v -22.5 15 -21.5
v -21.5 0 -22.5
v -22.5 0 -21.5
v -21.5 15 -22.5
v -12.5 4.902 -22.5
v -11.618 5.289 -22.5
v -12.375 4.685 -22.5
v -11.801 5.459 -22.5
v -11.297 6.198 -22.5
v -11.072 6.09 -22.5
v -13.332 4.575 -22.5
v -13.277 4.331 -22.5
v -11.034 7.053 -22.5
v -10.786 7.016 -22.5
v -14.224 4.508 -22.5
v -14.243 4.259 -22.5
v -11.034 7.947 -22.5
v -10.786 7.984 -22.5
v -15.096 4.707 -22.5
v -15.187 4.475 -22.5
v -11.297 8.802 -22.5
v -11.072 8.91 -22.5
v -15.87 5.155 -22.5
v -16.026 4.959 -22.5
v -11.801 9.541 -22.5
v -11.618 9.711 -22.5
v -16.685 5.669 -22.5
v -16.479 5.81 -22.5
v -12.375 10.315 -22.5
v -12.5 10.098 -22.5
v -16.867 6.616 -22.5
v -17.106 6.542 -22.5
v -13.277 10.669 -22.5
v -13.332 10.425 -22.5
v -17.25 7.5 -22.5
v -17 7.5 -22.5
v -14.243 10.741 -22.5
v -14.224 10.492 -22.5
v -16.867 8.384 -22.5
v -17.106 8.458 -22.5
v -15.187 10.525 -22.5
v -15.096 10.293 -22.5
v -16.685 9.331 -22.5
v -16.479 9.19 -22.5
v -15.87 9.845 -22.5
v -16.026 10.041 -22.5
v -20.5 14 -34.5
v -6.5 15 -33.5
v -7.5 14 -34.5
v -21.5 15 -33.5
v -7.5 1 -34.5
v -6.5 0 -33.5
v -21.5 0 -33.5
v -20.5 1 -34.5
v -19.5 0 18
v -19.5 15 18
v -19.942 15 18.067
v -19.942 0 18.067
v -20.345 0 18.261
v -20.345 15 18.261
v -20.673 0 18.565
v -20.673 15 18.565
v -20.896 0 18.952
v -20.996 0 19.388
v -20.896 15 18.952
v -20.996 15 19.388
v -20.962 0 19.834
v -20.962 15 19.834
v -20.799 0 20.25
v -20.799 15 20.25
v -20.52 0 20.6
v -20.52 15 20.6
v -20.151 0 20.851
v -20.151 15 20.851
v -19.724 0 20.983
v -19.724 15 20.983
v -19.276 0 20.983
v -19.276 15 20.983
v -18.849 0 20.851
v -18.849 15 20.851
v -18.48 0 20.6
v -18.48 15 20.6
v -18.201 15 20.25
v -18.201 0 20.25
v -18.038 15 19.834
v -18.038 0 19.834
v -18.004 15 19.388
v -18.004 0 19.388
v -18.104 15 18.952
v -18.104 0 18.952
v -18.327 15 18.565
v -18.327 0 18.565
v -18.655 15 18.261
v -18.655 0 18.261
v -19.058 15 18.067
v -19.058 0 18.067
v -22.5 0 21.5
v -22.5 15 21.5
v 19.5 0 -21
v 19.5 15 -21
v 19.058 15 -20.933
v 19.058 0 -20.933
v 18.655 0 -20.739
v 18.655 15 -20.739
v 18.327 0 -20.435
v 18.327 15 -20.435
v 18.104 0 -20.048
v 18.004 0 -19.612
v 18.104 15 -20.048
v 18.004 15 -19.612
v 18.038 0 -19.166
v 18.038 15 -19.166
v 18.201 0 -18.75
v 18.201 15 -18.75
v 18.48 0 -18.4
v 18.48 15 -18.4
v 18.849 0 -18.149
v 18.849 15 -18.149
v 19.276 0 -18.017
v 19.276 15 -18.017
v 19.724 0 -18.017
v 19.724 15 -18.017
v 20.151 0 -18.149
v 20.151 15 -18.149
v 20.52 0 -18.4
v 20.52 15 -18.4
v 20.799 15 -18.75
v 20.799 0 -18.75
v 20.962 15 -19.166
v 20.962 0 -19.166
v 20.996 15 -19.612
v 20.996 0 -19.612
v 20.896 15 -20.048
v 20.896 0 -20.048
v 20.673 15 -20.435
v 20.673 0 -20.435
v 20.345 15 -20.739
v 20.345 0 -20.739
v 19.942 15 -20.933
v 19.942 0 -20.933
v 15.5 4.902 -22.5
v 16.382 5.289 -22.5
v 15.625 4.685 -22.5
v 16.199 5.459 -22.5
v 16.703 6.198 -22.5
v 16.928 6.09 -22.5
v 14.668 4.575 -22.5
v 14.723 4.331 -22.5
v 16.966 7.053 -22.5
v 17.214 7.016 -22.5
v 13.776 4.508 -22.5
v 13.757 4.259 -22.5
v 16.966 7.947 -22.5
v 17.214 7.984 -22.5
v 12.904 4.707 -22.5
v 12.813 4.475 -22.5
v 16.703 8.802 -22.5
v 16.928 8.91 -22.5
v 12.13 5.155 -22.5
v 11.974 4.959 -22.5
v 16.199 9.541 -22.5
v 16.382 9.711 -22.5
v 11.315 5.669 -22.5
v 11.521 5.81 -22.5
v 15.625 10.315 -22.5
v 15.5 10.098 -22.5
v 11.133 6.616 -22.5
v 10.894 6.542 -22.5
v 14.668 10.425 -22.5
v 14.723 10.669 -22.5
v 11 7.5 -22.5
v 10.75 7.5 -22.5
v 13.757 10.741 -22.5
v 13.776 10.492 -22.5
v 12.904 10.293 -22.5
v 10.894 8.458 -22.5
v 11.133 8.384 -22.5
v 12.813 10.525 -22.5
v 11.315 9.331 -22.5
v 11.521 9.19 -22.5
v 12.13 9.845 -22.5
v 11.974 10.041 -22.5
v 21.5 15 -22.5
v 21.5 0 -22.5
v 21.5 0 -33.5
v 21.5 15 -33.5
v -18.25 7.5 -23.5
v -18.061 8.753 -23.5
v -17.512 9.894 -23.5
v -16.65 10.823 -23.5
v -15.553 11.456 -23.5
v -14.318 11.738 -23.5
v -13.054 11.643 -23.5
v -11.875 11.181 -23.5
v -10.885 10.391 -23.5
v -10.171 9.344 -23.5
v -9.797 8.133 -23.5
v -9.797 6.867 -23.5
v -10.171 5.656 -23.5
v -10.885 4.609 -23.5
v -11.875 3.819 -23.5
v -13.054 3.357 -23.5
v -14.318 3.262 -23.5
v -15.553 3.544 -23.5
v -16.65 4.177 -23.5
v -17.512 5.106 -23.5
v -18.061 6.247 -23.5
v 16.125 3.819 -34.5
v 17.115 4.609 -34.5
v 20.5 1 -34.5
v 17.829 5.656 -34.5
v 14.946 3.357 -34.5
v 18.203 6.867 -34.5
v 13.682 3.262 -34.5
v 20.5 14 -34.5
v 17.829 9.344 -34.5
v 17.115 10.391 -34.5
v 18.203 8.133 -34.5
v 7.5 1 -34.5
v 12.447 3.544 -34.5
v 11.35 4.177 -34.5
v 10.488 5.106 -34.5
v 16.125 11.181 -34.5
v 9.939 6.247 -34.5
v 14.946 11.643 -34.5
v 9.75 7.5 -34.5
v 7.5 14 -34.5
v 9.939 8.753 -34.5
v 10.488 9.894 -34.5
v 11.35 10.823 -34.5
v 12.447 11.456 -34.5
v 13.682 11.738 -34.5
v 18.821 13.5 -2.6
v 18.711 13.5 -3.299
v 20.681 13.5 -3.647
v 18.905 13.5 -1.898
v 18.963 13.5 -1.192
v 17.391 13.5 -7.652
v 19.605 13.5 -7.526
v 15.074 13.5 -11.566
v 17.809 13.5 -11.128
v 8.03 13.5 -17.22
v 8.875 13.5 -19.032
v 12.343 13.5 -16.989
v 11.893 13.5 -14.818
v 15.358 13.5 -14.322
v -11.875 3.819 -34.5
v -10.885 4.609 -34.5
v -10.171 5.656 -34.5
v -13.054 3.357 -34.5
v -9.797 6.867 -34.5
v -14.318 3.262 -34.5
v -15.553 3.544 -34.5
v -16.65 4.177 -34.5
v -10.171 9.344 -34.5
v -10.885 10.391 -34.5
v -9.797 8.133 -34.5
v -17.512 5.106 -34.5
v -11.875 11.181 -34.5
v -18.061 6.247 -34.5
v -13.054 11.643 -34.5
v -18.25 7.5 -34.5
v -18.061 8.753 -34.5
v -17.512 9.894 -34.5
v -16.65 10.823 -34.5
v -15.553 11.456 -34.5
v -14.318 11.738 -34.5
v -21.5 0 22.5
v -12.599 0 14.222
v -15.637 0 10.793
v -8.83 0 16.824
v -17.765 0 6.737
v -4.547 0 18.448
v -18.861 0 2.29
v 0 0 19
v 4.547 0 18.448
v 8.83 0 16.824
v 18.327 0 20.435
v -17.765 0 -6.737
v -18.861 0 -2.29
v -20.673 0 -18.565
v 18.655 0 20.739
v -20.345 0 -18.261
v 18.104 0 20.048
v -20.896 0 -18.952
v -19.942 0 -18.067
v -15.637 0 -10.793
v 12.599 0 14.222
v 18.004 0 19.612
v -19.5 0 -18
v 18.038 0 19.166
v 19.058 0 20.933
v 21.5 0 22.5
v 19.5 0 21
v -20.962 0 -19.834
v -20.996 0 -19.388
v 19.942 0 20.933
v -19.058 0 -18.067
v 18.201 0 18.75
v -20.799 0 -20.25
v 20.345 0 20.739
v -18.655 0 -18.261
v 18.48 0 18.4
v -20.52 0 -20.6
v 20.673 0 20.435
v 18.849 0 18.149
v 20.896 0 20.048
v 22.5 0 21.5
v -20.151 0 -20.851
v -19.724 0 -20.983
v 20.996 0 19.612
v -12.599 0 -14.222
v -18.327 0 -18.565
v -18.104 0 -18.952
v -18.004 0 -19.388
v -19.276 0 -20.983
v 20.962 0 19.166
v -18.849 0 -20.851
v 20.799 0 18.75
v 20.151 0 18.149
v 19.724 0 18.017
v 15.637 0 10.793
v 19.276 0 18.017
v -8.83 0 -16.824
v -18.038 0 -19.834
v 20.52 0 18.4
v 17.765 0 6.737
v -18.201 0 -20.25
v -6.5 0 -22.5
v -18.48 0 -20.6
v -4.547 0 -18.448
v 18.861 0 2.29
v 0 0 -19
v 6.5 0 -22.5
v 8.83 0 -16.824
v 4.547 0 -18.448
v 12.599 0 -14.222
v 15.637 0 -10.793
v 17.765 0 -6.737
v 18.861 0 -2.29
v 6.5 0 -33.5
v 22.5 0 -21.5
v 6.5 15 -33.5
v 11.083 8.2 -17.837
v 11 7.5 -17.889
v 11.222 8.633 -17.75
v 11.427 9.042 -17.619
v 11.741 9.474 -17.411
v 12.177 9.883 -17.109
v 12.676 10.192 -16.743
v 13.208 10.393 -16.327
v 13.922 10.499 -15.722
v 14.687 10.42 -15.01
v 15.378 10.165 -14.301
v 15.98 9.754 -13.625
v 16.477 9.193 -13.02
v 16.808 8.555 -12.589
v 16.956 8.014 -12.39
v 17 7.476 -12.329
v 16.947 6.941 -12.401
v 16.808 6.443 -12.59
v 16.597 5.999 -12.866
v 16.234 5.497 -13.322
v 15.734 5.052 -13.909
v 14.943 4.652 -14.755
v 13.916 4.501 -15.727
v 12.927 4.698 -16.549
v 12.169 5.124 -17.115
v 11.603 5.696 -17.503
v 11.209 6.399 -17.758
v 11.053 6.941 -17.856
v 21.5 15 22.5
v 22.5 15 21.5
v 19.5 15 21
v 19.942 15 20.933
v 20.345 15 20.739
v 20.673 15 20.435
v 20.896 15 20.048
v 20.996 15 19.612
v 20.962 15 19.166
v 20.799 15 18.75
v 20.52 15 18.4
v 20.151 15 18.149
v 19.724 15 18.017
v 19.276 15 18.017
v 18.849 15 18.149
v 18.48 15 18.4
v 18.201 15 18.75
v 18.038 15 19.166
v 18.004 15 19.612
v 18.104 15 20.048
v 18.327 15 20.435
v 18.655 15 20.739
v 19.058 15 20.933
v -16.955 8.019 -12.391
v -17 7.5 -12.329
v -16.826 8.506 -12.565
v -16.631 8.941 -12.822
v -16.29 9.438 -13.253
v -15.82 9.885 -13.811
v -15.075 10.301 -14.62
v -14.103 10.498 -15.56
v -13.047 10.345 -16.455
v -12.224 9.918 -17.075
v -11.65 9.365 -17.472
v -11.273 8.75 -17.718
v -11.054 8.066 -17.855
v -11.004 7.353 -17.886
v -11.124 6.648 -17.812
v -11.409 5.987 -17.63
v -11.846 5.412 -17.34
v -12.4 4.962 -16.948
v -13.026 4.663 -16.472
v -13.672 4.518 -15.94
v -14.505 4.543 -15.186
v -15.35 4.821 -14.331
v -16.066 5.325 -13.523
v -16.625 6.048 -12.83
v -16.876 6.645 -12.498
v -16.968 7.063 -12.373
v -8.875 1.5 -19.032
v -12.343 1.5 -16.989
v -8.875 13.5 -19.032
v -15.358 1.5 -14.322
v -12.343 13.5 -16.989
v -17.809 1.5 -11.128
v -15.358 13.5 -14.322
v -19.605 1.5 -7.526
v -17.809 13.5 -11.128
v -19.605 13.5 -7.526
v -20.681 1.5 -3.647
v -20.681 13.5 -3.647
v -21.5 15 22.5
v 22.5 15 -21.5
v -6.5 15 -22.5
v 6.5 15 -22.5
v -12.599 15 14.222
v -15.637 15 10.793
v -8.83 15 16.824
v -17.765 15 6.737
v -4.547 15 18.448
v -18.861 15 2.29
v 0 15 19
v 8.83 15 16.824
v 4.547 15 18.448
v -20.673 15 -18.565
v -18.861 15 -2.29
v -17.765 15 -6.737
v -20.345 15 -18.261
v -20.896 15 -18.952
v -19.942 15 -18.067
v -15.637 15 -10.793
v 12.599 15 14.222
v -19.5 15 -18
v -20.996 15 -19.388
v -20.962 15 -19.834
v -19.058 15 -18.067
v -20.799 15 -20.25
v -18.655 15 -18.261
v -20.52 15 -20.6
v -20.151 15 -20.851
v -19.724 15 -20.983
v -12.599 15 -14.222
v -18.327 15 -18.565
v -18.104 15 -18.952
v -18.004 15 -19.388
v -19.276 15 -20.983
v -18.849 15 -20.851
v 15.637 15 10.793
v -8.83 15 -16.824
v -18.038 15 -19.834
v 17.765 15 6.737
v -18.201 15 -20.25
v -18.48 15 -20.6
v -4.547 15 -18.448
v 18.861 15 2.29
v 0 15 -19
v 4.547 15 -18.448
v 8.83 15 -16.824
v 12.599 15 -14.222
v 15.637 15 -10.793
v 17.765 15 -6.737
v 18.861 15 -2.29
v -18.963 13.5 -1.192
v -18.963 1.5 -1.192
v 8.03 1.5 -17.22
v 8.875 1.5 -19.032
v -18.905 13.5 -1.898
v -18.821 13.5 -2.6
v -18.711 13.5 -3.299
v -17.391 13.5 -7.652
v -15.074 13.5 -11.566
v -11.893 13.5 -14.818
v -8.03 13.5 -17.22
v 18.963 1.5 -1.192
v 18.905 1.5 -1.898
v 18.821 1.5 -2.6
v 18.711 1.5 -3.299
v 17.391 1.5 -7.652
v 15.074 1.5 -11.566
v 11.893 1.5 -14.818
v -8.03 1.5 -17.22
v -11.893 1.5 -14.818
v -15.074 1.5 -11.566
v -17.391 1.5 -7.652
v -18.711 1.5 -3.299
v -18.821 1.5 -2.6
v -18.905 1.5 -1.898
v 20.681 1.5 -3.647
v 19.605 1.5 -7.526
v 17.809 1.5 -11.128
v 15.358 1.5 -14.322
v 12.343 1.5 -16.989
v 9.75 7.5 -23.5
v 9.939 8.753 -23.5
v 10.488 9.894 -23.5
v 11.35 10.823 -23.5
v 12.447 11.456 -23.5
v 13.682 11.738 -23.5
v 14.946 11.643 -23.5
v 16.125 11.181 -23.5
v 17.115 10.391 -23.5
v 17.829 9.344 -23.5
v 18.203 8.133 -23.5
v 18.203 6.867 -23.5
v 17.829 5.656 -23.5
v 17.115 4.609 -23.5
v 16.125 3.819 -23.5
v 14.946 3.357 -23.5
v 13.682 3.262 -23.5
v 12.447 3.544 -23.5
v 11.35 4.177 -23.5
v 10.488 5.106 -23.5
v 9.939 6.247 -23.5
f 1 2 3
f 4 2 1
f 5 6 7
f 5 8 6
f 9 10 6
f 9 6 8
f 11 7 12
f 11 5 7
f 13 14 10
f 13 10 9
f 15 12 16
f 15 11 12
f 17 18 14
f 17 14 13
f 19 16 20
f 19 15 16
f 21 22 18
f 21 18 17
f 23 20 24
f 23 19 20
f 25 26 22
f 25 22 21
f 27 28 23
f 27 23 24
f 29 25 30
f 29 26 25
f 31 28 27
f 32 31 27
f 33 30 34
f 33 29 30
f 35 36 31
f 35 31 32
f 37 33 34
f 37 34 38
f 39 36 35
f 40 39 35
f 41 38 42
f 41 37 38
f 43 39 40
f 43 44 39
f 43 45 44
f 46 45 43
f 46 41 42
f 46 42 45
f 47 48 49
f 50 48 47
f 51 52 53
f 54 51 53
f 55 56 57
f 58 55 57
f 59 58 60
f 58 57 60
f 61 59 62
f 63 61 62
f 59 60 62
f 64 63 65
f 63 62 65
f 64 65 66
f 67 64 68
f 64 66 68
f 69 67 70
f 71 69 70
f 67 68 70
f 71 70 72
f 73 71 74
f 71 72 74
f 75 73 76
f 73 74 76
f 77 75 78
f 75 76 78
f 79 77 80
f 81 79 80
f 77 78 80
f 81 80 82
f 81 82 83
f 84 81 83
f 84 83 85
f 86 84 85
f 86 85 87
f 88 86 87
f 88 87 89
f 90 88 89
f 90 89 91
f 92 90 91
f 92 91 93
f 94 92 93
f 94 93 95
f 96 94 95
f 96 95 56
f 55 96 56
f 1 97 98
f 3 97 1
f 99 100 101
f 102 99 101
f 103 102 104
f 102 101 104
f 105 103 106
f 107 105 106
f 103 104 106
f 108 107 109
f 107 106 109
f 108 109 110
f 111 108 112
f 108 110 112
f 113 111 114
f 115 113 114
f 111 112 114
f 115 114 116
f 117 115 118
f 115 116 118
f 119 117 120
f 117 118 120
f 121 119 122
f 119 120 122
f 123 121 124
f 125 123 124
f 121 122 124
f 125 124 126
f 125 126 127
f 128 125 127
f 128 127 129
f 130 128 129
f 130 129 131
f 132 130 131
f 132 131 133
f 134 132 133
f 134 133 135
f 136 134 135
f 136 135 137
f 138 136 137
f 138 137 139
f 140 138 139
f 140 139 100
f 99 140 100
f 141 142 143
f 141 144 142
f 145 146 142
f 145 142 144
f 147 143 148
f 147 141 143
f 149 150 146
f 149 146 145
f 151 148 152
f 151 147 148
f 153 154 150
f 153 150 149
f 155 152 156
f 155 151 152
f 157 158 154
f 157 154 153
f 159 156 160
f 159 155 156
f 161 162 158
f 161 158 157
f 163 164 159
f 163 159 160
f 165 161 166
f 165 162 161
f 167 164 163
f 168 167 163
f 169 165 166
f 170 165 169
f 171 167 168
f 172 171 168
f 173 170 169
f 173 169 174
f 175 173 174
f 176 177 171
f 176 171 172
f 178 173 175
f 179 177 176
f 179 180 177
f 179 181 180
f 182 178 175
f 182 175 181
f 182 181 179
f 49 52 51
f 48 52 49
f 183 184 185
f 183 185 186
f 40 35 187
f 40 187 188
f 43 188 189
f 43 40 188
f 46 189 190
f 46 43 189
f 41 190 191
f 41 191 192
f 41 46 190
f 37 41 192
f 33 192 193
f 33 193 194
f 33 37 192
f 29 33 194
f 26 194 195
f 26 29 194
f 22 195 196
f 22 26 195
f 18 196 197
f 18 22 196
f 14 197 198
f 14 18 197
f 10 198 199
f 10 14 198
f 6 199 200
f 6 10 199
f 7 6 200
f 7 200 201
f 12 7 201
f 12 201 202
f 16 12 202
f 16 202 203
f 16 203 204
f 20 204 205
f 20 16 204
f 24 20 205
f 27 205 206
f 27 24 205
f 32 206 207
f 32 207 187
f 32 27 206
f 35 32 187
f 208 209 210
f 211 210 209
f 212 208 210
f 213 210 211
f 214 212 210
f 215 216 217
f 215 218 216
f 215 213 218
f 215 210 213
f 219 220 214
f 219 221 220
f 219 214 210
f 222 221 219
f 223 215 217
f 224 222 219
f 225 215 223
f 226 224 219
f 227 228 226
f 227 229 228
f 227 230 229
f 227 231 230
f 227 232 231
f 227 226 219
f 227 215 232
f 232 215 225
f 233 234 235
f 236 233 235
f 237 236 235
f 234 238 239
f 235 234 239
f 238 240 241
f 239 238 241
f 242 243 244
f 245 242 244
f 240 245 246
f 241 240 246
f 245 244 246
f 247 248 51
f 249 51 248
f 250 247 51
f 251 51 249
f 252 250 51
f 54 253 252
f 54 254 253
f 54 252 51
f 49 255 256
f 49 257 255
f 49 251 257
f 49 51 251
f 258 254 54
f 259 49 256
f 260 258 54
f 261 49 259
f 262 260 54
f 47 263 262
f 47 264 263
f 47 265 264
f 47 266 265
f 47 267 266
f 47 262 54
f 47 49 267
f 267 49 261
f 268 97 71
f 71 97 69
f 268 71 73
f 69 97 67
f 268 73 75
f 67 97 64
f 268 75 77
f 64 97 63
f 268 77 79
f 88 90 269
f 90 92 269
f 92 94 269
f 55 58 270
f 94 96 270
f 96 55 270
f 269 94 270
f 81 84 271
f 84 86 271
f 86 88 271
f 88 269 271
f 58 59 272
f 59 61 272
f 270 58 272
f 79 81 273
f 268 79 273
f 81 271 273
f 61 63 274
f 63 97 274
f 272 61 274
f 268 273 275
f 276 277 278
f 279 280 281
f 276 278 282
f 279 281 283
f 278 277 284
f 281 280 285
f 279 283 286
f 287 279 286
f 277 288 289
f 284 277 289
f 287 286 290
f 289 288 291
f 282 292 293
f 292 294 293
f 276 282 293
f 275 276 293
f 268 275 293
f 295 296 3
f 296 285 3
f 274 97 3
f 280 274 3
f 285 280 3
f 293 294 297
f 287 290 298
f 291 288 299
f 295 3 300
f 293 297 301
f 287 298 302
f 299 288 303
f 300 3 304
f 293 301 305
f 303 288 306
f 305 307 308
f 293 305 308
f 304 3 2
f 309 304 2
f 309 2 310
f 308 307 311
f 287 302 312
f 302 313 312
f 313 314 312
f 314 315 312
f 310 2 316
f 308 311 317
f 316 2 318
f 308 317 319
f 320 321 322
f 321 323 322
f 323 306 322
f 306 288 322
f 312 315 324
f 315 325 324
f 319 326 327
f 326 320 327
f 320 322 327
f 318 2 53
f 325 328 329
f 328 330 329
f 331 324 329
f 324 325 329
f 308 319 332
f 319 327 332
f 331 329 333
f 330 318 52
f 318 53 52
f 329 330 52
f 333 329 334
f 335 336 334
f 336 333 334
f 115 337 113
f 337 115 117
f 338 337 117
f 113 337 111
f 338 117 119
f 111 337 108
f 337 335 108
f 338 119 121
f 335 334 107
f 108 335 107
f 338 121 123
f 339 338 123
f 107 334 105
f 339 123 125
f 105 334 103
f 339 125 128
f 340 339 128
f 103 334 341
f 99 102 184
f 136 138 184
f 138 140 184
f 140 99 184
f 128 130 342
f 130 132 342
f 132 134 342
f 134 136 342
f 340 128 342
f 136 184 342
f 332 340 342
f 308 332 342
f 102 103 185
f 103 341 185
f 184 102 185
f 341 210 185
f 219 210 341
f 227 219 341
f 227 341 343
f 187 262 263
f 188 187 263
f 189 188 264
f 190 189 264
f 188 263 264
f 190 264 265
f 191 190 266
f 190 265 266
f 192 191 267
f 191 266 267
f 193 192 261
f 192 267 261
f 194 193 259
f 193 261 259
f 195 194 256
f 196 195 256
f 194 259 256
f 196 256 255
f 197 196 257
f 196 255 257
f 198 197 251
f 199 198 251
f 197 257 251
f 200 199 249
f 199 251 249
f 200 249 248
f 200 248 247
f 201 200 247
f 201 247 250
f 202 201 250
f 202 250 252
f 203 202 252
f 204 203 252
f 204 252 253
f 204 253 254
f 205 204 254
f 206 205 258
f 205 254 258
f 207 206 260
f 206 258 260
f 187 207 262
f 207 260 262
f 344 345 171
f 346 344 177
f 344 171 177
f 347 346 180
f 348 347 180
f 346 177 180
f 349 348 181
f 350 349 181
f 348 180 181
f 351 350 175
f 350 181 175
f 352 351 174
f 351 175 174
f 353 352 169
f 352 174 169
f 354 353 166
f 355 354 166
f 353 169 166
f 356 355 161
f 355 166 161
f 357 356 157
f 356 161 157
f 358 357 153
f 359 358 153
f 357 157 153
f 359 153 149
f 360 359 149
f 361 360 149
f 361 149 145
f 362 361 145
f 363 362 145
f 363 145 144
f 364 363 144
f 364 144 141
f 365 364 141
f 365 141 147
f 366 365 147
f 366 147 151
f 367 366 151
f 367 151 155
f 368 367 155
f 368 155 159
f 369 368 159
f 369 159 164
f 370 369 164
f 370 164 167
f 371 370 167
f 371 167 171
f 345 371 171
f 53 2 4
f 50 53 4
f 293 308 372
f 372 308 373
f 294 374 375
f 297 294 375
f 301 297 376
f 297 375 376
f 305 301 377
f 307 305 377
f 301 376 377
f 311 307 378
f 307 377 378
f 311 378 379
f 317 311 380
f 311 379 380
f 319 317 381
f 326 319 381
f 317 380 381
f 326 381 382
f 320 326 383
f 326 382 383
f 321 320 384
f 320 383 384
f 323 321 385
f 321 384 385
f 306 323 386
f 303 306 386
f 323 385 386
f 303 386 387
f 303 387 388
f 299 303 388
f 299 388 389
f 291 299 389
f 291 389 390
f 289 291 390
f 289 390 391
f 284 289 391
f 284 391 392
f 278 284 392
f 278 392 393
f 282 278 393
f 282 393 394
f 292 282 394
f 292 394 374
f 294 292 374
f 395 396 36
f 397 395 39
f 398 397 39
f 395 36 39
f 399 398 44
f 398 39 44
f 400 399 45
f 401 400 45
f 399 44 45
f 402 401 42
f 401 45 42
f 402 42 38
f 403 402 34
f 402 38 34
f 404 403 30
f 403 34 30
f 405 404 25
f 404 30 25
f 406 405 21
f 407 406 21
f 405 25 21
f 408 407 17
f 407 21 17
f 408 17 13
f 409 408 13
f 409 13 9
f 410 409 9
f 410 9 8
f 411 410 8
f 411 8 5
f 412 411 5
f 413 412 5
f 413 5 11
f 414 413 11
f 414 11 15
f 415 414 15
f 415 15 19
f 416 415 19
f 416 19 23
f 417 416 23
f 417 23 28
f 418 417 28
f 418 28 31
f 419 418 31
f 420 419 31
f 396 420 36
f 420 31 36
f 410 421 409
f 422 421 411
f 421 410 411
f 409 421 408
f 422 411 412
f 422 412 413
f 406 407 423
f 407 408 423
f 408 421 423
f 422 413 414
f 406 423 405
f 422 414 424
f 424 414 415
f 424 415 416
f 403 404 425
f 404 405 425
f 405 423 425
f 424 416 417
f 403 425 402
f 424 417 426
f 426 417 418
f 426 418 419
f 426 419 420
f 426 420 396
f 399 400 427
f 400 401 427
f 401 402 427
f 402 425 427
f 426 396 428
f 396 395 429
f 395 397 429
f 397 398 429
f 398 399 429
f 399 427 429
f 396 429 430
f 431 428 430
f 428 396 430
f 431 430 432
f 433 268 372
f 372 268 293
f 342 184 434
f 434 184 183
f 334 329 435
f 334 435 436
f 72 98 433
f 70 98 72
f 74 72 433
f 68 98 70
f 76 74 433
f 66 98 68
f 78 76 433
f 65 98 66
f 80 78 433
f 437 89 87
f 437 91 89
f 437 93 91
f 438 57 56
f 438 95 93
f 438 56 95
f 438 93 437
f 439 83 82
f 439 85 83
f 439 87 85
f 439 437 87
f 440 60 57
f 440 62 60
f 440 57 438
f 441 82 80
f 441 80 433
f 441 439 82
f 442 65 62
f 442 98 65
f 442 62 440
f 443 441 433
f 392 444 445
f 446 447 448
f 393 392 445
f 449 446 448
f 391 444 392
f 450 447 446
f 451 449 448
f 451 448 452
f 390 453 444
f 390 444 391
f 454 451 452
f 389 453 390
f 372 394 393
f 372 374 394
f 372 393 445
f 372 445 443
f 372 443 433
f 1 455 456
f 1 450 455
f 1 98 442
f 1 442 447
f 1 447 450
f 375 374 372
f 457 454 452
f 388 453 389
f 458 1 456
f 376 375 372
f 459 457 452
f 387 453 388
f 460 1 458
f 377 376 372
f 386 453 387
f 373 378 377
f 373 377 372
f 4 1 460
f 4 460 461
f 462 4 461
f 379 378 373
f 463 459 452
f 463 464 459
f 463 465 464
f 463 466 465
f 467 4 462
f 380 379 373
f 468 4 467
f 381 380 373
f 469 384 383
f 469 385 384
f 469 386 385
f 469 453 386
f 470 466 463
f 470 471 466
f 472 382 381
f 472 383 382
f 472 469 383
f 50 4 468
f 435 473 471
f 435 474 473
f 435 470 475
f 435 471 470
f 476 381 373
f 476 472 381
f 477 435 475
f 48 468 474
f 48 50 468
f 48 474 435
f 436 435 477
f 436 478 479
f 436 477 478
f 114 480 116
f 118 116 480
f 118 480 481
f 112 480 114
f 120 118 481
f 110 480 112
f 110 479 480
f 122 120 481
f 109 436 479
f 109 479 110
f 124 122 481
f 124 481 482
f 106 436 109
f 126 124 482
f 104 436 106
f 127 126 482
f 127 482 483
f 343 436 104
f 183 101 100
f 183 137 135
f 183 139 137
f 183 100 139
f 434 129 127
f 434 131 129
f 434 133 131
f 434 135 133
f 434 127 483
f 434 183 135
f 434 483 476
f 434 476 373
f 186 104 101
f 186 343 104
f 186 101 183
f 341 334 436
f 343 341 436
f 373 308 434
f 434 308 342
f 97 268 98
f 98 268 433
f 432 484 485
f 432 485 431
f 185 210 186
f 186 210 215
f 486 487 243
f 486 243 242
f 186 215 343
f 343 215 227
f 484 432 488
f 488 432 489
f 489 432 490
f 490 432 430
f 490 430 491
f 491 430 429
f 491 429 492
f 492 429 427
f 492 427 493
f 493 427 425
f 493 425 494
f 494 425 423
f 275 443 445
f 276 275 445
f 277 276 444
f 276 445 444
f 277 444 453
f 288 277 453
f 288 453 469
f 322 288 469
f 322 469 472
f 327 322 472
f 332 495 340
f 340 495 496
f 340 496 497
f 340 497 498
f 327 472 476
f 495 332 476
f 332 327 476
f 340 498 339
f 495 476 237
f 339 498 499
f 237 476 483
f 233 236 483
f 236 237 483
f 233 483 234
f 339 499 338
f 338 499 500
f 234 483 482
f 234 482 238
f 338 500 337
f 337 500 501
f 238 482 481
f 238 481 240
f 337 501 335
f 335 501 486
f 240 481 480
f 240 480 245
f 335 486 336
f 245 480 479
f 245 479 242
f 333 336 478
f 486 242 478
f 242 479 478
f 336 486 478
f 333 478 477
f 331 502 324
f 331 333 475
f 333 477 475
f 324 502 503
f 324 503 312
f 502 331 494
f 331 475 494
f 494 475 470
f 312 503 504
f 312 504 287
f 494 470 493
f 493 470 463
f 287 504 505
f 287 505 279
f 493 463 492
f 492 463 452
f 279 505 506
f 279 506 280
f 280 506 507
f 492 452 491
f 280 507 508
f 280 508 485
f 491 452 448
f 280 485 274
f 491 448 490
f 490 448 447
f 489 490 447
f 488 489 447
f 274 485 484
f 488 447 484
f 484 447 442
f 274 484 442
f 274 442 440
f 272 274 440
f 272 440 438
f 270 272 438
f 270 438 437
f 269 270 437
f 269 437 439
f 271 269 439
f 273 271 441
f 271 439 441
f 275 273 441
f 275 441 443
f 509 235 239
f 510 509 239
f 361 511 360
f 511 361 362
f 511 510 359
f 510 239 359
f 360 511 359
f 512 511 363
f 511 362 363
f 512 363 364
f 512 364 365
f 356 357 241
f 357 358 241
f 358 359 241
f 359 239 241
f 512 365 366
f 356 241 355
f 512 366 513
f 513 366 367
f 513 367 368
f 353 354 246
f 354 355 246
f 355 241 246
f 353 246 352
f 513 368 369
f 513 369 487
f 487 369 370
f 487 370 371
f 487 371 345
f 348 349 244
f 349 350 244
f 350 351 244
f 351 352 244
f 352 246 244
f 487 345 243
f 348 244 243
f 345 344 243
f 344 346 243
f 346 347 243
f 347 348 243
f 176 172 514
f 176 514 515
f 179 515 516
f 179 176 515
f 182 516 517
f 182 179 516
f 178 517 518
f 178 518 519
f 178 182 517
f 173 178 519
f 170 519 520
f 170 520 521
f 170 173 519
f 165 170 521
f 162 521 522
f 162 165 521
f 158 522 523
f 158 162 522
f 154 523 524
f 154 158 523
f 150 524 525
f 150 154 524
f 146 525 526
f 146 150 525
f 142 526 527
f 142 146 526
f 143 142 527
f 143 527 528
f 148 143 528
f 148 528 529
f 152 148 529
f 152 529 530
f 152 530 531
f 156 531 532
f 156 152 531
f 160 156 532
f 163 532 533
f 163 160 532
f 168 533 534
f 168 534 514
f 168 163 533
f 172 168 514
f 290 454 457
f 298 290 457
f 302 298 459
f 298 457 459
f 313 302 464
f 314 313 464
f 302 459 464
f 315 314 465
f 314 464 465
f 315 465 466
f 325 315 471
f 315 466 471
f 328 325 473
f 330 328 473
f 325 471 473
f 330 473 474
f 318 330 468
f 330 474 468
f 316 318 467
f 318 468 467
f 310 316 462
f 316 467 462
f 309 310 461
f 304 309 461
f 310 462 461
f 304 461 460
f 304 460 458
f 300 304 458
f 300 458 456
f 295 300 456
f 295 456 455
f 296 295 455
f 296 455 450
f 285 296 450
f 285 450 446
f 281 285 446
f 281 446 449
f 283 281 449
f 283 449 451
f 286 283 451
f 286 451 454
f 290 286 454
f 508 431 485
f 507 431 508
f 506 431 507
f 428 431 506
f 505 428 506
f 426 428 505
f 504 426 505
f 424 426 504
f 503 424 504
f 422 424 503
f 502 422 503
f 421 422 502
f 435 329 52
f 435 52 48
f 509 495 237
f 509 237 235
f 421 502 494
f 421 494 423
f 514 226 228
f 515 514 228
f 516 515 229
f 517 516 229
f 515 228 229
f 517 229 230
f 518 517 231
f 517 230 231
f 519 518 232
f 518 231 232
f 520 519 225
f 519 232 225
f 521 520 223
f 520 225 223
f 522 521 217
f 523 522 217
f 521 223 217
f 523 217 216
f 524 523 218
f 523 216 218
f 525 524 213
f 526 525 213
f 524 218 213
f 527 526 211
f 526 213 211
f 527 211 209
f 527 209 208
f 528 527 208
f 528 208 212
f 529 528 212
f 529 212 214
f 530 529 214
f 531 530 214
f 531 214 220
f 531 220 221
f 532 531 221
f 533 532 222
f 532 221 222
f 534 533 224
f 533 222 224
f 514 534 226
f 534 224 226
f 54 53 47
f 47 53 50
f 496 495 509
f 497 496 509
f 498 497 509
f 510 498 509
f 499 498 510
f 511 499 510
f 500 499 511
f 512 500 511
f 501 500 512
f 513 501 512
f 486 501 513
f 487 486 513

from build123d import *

# Parameters (mm, degrees)
SKETCH_1_W               = 45
SKETCH_1_H               = 45
EXTRUDE_1_DEPTH          = 15
SKETCH_2_R               = 19
CUT_EXTRUDE_1_DEPTH      = 36.178118199
SKETCH_5_W               = 15
SKETCH_5_H               = 15
EXTRUDE_2_DEPTH          = 12
SKETCH_6_R               = 3
CUT_EXTRUDE_4_DEPTH      = 35
SKETCH_7_R               = 1.5
CUT_EXTRUDE_5_DEPTH      = 44.834917702
CUT_EXTRUDE_6_DEPTH      = 6
CUT_EXTRUDE_6_DEPTH_BACK = 6
SKETCH_9_R               = 4.25
CUT_EXTRUDE_7_DEPTH      = 12
CHAMFER_1_SIZE           = 2
CHAMFER_2_SIZE           = 1
CHAMFER_3_SIZE           = 1
CHAMFER_4_SIZE           = 1


# Some blends are built 0.0001 mm under size
with BuildPart() as part:
    # 草图1 → 凸台-拉伸1 (new body)
    with BuildSketch(Plane(origin=(0, 0, 0), x_dir=(1, 0, 0), z_dir=(0, 1, 0))):
        Rectangle(SKETCH_1_W, SKETCH_1_H)
    extrude(amount=EXTRUDE_1_DEPTH)

    # 草图2 → 切除-拉伸1 (cut, through all)
    with BuildSketch(Plane(origin=(0, 15, 0), x_dir=(1, 0, 0), z_dir=(0, 1, 0))):
        with Locations(Location((0, 0, 0), (0, 0, 270))):
            Circle(SKETCH_2_R)
    extrude(amount=-CUT_EXTRUDE_1_DEPTH, mode=Mode.SUBTRACT)

    # 草图5 → 凸台-拉伸2 (add)
    with BuildSketch(Plane(origin=(0, 0, -22.5), x_dir=(-1, 0, 0), z_dir=(0, 0, -1))):
        with Locations((14, 7.5)):
            Rectangle(SKETCH_5_W, SKETCH_5_H)
        with Locations((-14, 7.5)):
            Rectangle(SKETCH_5_W, SKETCH_5_H)
    extrude(amount=EXTRUDE_2_DEPTH)

    # 草图6 → 切除-拉伸4 (cut)
    with BuildSketch(Plane(origin=(0, 0, -34.5), x_dir=(-1, 0, 0), z_dir=(0, 0, -1))):
        with Locations((-14, 7.5)):
            Circle(SKETCH_6_R)
        with Locations((14, 7.5)):
            Circle(SKETCH_6_R)
    extrude(amount=-CUT_EXTRUDE_4_DEPTH, mode=Mode.SUBTRACT)

    # 草图7 → 切除-拉伸5 (cut, through all)
    with BuildSketch(Plane(origin=(0, 15, 0), x_dir=(1, 0, 0), z_dir=(0, 1, 0))):
        with Locations(Location((-19.5, 19.5, 0), (0, 0, 270))):
            Circle(SKETCH_7_R)
        with Locations(Location((19.5, 19.5, 0), (0, 0, 90))):
            Circle(SKETCH_7_R)
        with Locations(Location((19.5, -19.5, 0), (0, 0, 270))):
            Circle(SKETCH_7_R)
        with Locations(Location((-19.5, -19.5, 0), (0, 0, 90))):
            Circle(SKETCH_7_R)
    extrude(amount=-CUT_EXTRUDE_5_DEPTH, mode=Mode.SUBTRACT)

    # 草图8 → 切除-拉伸6 (cut, two sides: drawn at the far end of the back side and taken through both)
    with BuildSketch(Plane(origin=(0, 7.5, 0), x_dir=(-1, 0, 0), z_dir=(0, -1, 0)).offset(-CUT_EXTRUDE_6_DEPTH_BACK)):
        with BuildLine():
            Line((-8.874983497, 19.032463528), (-8.029746973, 17.219847954))
            ThreePointArc((-8.029746973, 17.219847954), (-15.073713466, 11.566467151), (-18.711347307, 3.299315376))
            Line((-18.711347307, 3.299315376), (-20.680962813, 3.646611731))
            ThreePointArc((-20.680962813, 3.646611731), (-16.660420146, 12.783990009), (-8.874983497, 19.032463528))
        make_face()
        with BuildLine():
            Line((20.680962813, 3.646611731), (18.711347307, 3.299315376))
            ThreePointArc((18.711347307, 3.299315376), (15.073713466, 11.566467151), (8.029746973, 17.219847954))
            Line((8.029746973, 17.219847954), (8.874983497, 19.032463528))
            ThreePointArc((8.874983497, 19.032463528), (16.660420146, 12.783990009), (20.680962813, 3.646611731))
        make_face()
    extrude(amount=CUT_EXTRUDE_6_DEPTH + CUT_EXTRUDE_6_DEPTH_BACK, mode=Mode.SUBTRACT)

    # 草图9 → 切除-拉伸7 (cut)
    with BuildSketch(Plane(origin=(0, 0, -34.5), x_dir=(-1, 0, 0), z_dir=(0, 0, -1))):
        with Locations((-14, 7.5)):
            Circle(SKETCH_9_R)
        with Locations((14, 7.5)):
            Circle(SKETCH_9_R)
    extrude(amount=-CUT_EXTRUDE_7_DEPTH, mode=Mode.SUBTRACT)

    # 倒角1
    # the kernel refuses this chamfer: 2 mm, written as the material it takes off along each edge
    with BuildSketch(Plane(origin=(-18.711347307, 1.5, -3.299315376), x_dir=(-0.11838916494267775, 0, 0.9929672731888879), z_dir=(0, 1, 0)), Plane(origin=(18.711347307, 13.5, -3.299315376), x_dir=(0.11838916494267755, 0, 0.9929672731888879), z_dir=(0, -1, 0))) as chamfer_1_piece_1:
        with BuildLine():
            Line((2.121782819, 0), (-CHAMFER_1_SIZE * 0.055836389964, -CHAMFER_1_SIZE * 0.998439931872))
            Line((-CHAMFER_1_SIZE * 0.055836389964, -CHAMFER_1_SIZE * 0.998439931872), (0, 0))
            ThreePointArc((0, 0), (1.090799435, -0.029617755), (2.121782819, 0))
        make_face()
    extrude(amount=12, mode=Mode.SUBTRACT)

    # 倒角2
    chamfer_2_edges = [part.edges().sort_by_distance(p)[0] for p in [
        (22.5, 7.5, 22.5),
        (-22.5, 7.5, 22.5),
        (-22.5, 7.5, -22.5),
        (22.5, 7.5, -22.5),
    ]]
    chamfer(chamfer_2_edges, length=CHAMFER_2_SIZE - 0.0001)  # a hair under: the kernel refuses the full size

    # 倒角3
    chamfer_3_edges = [part.edges().sort_by_distance(p)[0] for p in [
        (18.25, 7.5, -22.5),
        (-9.75, 7.5, -22.5),
    ]]
    chamfer(chamfer_3_edges, length=CHAMFER_3_SIZE)

    # 倒角4
    chamfer_4_edges = [part.edges().sort_by_distance(p)[0] for p in [
        (6.5, 7.5, -34.5),
        (14, 15, -34.5),
        (21.5, 7.5, -34.5),
        (14, 0, -34.5),
        (-21.5, 7.5, -34.5),
        (-14, 15, -34.5),
        (-6.5, 7.5, -34.5),
        (-14, 0, -34.5),
    ]]
    chamfer(chamfer_4_edges, length=CHAMFER_4_SIZE)


solid = part.part
